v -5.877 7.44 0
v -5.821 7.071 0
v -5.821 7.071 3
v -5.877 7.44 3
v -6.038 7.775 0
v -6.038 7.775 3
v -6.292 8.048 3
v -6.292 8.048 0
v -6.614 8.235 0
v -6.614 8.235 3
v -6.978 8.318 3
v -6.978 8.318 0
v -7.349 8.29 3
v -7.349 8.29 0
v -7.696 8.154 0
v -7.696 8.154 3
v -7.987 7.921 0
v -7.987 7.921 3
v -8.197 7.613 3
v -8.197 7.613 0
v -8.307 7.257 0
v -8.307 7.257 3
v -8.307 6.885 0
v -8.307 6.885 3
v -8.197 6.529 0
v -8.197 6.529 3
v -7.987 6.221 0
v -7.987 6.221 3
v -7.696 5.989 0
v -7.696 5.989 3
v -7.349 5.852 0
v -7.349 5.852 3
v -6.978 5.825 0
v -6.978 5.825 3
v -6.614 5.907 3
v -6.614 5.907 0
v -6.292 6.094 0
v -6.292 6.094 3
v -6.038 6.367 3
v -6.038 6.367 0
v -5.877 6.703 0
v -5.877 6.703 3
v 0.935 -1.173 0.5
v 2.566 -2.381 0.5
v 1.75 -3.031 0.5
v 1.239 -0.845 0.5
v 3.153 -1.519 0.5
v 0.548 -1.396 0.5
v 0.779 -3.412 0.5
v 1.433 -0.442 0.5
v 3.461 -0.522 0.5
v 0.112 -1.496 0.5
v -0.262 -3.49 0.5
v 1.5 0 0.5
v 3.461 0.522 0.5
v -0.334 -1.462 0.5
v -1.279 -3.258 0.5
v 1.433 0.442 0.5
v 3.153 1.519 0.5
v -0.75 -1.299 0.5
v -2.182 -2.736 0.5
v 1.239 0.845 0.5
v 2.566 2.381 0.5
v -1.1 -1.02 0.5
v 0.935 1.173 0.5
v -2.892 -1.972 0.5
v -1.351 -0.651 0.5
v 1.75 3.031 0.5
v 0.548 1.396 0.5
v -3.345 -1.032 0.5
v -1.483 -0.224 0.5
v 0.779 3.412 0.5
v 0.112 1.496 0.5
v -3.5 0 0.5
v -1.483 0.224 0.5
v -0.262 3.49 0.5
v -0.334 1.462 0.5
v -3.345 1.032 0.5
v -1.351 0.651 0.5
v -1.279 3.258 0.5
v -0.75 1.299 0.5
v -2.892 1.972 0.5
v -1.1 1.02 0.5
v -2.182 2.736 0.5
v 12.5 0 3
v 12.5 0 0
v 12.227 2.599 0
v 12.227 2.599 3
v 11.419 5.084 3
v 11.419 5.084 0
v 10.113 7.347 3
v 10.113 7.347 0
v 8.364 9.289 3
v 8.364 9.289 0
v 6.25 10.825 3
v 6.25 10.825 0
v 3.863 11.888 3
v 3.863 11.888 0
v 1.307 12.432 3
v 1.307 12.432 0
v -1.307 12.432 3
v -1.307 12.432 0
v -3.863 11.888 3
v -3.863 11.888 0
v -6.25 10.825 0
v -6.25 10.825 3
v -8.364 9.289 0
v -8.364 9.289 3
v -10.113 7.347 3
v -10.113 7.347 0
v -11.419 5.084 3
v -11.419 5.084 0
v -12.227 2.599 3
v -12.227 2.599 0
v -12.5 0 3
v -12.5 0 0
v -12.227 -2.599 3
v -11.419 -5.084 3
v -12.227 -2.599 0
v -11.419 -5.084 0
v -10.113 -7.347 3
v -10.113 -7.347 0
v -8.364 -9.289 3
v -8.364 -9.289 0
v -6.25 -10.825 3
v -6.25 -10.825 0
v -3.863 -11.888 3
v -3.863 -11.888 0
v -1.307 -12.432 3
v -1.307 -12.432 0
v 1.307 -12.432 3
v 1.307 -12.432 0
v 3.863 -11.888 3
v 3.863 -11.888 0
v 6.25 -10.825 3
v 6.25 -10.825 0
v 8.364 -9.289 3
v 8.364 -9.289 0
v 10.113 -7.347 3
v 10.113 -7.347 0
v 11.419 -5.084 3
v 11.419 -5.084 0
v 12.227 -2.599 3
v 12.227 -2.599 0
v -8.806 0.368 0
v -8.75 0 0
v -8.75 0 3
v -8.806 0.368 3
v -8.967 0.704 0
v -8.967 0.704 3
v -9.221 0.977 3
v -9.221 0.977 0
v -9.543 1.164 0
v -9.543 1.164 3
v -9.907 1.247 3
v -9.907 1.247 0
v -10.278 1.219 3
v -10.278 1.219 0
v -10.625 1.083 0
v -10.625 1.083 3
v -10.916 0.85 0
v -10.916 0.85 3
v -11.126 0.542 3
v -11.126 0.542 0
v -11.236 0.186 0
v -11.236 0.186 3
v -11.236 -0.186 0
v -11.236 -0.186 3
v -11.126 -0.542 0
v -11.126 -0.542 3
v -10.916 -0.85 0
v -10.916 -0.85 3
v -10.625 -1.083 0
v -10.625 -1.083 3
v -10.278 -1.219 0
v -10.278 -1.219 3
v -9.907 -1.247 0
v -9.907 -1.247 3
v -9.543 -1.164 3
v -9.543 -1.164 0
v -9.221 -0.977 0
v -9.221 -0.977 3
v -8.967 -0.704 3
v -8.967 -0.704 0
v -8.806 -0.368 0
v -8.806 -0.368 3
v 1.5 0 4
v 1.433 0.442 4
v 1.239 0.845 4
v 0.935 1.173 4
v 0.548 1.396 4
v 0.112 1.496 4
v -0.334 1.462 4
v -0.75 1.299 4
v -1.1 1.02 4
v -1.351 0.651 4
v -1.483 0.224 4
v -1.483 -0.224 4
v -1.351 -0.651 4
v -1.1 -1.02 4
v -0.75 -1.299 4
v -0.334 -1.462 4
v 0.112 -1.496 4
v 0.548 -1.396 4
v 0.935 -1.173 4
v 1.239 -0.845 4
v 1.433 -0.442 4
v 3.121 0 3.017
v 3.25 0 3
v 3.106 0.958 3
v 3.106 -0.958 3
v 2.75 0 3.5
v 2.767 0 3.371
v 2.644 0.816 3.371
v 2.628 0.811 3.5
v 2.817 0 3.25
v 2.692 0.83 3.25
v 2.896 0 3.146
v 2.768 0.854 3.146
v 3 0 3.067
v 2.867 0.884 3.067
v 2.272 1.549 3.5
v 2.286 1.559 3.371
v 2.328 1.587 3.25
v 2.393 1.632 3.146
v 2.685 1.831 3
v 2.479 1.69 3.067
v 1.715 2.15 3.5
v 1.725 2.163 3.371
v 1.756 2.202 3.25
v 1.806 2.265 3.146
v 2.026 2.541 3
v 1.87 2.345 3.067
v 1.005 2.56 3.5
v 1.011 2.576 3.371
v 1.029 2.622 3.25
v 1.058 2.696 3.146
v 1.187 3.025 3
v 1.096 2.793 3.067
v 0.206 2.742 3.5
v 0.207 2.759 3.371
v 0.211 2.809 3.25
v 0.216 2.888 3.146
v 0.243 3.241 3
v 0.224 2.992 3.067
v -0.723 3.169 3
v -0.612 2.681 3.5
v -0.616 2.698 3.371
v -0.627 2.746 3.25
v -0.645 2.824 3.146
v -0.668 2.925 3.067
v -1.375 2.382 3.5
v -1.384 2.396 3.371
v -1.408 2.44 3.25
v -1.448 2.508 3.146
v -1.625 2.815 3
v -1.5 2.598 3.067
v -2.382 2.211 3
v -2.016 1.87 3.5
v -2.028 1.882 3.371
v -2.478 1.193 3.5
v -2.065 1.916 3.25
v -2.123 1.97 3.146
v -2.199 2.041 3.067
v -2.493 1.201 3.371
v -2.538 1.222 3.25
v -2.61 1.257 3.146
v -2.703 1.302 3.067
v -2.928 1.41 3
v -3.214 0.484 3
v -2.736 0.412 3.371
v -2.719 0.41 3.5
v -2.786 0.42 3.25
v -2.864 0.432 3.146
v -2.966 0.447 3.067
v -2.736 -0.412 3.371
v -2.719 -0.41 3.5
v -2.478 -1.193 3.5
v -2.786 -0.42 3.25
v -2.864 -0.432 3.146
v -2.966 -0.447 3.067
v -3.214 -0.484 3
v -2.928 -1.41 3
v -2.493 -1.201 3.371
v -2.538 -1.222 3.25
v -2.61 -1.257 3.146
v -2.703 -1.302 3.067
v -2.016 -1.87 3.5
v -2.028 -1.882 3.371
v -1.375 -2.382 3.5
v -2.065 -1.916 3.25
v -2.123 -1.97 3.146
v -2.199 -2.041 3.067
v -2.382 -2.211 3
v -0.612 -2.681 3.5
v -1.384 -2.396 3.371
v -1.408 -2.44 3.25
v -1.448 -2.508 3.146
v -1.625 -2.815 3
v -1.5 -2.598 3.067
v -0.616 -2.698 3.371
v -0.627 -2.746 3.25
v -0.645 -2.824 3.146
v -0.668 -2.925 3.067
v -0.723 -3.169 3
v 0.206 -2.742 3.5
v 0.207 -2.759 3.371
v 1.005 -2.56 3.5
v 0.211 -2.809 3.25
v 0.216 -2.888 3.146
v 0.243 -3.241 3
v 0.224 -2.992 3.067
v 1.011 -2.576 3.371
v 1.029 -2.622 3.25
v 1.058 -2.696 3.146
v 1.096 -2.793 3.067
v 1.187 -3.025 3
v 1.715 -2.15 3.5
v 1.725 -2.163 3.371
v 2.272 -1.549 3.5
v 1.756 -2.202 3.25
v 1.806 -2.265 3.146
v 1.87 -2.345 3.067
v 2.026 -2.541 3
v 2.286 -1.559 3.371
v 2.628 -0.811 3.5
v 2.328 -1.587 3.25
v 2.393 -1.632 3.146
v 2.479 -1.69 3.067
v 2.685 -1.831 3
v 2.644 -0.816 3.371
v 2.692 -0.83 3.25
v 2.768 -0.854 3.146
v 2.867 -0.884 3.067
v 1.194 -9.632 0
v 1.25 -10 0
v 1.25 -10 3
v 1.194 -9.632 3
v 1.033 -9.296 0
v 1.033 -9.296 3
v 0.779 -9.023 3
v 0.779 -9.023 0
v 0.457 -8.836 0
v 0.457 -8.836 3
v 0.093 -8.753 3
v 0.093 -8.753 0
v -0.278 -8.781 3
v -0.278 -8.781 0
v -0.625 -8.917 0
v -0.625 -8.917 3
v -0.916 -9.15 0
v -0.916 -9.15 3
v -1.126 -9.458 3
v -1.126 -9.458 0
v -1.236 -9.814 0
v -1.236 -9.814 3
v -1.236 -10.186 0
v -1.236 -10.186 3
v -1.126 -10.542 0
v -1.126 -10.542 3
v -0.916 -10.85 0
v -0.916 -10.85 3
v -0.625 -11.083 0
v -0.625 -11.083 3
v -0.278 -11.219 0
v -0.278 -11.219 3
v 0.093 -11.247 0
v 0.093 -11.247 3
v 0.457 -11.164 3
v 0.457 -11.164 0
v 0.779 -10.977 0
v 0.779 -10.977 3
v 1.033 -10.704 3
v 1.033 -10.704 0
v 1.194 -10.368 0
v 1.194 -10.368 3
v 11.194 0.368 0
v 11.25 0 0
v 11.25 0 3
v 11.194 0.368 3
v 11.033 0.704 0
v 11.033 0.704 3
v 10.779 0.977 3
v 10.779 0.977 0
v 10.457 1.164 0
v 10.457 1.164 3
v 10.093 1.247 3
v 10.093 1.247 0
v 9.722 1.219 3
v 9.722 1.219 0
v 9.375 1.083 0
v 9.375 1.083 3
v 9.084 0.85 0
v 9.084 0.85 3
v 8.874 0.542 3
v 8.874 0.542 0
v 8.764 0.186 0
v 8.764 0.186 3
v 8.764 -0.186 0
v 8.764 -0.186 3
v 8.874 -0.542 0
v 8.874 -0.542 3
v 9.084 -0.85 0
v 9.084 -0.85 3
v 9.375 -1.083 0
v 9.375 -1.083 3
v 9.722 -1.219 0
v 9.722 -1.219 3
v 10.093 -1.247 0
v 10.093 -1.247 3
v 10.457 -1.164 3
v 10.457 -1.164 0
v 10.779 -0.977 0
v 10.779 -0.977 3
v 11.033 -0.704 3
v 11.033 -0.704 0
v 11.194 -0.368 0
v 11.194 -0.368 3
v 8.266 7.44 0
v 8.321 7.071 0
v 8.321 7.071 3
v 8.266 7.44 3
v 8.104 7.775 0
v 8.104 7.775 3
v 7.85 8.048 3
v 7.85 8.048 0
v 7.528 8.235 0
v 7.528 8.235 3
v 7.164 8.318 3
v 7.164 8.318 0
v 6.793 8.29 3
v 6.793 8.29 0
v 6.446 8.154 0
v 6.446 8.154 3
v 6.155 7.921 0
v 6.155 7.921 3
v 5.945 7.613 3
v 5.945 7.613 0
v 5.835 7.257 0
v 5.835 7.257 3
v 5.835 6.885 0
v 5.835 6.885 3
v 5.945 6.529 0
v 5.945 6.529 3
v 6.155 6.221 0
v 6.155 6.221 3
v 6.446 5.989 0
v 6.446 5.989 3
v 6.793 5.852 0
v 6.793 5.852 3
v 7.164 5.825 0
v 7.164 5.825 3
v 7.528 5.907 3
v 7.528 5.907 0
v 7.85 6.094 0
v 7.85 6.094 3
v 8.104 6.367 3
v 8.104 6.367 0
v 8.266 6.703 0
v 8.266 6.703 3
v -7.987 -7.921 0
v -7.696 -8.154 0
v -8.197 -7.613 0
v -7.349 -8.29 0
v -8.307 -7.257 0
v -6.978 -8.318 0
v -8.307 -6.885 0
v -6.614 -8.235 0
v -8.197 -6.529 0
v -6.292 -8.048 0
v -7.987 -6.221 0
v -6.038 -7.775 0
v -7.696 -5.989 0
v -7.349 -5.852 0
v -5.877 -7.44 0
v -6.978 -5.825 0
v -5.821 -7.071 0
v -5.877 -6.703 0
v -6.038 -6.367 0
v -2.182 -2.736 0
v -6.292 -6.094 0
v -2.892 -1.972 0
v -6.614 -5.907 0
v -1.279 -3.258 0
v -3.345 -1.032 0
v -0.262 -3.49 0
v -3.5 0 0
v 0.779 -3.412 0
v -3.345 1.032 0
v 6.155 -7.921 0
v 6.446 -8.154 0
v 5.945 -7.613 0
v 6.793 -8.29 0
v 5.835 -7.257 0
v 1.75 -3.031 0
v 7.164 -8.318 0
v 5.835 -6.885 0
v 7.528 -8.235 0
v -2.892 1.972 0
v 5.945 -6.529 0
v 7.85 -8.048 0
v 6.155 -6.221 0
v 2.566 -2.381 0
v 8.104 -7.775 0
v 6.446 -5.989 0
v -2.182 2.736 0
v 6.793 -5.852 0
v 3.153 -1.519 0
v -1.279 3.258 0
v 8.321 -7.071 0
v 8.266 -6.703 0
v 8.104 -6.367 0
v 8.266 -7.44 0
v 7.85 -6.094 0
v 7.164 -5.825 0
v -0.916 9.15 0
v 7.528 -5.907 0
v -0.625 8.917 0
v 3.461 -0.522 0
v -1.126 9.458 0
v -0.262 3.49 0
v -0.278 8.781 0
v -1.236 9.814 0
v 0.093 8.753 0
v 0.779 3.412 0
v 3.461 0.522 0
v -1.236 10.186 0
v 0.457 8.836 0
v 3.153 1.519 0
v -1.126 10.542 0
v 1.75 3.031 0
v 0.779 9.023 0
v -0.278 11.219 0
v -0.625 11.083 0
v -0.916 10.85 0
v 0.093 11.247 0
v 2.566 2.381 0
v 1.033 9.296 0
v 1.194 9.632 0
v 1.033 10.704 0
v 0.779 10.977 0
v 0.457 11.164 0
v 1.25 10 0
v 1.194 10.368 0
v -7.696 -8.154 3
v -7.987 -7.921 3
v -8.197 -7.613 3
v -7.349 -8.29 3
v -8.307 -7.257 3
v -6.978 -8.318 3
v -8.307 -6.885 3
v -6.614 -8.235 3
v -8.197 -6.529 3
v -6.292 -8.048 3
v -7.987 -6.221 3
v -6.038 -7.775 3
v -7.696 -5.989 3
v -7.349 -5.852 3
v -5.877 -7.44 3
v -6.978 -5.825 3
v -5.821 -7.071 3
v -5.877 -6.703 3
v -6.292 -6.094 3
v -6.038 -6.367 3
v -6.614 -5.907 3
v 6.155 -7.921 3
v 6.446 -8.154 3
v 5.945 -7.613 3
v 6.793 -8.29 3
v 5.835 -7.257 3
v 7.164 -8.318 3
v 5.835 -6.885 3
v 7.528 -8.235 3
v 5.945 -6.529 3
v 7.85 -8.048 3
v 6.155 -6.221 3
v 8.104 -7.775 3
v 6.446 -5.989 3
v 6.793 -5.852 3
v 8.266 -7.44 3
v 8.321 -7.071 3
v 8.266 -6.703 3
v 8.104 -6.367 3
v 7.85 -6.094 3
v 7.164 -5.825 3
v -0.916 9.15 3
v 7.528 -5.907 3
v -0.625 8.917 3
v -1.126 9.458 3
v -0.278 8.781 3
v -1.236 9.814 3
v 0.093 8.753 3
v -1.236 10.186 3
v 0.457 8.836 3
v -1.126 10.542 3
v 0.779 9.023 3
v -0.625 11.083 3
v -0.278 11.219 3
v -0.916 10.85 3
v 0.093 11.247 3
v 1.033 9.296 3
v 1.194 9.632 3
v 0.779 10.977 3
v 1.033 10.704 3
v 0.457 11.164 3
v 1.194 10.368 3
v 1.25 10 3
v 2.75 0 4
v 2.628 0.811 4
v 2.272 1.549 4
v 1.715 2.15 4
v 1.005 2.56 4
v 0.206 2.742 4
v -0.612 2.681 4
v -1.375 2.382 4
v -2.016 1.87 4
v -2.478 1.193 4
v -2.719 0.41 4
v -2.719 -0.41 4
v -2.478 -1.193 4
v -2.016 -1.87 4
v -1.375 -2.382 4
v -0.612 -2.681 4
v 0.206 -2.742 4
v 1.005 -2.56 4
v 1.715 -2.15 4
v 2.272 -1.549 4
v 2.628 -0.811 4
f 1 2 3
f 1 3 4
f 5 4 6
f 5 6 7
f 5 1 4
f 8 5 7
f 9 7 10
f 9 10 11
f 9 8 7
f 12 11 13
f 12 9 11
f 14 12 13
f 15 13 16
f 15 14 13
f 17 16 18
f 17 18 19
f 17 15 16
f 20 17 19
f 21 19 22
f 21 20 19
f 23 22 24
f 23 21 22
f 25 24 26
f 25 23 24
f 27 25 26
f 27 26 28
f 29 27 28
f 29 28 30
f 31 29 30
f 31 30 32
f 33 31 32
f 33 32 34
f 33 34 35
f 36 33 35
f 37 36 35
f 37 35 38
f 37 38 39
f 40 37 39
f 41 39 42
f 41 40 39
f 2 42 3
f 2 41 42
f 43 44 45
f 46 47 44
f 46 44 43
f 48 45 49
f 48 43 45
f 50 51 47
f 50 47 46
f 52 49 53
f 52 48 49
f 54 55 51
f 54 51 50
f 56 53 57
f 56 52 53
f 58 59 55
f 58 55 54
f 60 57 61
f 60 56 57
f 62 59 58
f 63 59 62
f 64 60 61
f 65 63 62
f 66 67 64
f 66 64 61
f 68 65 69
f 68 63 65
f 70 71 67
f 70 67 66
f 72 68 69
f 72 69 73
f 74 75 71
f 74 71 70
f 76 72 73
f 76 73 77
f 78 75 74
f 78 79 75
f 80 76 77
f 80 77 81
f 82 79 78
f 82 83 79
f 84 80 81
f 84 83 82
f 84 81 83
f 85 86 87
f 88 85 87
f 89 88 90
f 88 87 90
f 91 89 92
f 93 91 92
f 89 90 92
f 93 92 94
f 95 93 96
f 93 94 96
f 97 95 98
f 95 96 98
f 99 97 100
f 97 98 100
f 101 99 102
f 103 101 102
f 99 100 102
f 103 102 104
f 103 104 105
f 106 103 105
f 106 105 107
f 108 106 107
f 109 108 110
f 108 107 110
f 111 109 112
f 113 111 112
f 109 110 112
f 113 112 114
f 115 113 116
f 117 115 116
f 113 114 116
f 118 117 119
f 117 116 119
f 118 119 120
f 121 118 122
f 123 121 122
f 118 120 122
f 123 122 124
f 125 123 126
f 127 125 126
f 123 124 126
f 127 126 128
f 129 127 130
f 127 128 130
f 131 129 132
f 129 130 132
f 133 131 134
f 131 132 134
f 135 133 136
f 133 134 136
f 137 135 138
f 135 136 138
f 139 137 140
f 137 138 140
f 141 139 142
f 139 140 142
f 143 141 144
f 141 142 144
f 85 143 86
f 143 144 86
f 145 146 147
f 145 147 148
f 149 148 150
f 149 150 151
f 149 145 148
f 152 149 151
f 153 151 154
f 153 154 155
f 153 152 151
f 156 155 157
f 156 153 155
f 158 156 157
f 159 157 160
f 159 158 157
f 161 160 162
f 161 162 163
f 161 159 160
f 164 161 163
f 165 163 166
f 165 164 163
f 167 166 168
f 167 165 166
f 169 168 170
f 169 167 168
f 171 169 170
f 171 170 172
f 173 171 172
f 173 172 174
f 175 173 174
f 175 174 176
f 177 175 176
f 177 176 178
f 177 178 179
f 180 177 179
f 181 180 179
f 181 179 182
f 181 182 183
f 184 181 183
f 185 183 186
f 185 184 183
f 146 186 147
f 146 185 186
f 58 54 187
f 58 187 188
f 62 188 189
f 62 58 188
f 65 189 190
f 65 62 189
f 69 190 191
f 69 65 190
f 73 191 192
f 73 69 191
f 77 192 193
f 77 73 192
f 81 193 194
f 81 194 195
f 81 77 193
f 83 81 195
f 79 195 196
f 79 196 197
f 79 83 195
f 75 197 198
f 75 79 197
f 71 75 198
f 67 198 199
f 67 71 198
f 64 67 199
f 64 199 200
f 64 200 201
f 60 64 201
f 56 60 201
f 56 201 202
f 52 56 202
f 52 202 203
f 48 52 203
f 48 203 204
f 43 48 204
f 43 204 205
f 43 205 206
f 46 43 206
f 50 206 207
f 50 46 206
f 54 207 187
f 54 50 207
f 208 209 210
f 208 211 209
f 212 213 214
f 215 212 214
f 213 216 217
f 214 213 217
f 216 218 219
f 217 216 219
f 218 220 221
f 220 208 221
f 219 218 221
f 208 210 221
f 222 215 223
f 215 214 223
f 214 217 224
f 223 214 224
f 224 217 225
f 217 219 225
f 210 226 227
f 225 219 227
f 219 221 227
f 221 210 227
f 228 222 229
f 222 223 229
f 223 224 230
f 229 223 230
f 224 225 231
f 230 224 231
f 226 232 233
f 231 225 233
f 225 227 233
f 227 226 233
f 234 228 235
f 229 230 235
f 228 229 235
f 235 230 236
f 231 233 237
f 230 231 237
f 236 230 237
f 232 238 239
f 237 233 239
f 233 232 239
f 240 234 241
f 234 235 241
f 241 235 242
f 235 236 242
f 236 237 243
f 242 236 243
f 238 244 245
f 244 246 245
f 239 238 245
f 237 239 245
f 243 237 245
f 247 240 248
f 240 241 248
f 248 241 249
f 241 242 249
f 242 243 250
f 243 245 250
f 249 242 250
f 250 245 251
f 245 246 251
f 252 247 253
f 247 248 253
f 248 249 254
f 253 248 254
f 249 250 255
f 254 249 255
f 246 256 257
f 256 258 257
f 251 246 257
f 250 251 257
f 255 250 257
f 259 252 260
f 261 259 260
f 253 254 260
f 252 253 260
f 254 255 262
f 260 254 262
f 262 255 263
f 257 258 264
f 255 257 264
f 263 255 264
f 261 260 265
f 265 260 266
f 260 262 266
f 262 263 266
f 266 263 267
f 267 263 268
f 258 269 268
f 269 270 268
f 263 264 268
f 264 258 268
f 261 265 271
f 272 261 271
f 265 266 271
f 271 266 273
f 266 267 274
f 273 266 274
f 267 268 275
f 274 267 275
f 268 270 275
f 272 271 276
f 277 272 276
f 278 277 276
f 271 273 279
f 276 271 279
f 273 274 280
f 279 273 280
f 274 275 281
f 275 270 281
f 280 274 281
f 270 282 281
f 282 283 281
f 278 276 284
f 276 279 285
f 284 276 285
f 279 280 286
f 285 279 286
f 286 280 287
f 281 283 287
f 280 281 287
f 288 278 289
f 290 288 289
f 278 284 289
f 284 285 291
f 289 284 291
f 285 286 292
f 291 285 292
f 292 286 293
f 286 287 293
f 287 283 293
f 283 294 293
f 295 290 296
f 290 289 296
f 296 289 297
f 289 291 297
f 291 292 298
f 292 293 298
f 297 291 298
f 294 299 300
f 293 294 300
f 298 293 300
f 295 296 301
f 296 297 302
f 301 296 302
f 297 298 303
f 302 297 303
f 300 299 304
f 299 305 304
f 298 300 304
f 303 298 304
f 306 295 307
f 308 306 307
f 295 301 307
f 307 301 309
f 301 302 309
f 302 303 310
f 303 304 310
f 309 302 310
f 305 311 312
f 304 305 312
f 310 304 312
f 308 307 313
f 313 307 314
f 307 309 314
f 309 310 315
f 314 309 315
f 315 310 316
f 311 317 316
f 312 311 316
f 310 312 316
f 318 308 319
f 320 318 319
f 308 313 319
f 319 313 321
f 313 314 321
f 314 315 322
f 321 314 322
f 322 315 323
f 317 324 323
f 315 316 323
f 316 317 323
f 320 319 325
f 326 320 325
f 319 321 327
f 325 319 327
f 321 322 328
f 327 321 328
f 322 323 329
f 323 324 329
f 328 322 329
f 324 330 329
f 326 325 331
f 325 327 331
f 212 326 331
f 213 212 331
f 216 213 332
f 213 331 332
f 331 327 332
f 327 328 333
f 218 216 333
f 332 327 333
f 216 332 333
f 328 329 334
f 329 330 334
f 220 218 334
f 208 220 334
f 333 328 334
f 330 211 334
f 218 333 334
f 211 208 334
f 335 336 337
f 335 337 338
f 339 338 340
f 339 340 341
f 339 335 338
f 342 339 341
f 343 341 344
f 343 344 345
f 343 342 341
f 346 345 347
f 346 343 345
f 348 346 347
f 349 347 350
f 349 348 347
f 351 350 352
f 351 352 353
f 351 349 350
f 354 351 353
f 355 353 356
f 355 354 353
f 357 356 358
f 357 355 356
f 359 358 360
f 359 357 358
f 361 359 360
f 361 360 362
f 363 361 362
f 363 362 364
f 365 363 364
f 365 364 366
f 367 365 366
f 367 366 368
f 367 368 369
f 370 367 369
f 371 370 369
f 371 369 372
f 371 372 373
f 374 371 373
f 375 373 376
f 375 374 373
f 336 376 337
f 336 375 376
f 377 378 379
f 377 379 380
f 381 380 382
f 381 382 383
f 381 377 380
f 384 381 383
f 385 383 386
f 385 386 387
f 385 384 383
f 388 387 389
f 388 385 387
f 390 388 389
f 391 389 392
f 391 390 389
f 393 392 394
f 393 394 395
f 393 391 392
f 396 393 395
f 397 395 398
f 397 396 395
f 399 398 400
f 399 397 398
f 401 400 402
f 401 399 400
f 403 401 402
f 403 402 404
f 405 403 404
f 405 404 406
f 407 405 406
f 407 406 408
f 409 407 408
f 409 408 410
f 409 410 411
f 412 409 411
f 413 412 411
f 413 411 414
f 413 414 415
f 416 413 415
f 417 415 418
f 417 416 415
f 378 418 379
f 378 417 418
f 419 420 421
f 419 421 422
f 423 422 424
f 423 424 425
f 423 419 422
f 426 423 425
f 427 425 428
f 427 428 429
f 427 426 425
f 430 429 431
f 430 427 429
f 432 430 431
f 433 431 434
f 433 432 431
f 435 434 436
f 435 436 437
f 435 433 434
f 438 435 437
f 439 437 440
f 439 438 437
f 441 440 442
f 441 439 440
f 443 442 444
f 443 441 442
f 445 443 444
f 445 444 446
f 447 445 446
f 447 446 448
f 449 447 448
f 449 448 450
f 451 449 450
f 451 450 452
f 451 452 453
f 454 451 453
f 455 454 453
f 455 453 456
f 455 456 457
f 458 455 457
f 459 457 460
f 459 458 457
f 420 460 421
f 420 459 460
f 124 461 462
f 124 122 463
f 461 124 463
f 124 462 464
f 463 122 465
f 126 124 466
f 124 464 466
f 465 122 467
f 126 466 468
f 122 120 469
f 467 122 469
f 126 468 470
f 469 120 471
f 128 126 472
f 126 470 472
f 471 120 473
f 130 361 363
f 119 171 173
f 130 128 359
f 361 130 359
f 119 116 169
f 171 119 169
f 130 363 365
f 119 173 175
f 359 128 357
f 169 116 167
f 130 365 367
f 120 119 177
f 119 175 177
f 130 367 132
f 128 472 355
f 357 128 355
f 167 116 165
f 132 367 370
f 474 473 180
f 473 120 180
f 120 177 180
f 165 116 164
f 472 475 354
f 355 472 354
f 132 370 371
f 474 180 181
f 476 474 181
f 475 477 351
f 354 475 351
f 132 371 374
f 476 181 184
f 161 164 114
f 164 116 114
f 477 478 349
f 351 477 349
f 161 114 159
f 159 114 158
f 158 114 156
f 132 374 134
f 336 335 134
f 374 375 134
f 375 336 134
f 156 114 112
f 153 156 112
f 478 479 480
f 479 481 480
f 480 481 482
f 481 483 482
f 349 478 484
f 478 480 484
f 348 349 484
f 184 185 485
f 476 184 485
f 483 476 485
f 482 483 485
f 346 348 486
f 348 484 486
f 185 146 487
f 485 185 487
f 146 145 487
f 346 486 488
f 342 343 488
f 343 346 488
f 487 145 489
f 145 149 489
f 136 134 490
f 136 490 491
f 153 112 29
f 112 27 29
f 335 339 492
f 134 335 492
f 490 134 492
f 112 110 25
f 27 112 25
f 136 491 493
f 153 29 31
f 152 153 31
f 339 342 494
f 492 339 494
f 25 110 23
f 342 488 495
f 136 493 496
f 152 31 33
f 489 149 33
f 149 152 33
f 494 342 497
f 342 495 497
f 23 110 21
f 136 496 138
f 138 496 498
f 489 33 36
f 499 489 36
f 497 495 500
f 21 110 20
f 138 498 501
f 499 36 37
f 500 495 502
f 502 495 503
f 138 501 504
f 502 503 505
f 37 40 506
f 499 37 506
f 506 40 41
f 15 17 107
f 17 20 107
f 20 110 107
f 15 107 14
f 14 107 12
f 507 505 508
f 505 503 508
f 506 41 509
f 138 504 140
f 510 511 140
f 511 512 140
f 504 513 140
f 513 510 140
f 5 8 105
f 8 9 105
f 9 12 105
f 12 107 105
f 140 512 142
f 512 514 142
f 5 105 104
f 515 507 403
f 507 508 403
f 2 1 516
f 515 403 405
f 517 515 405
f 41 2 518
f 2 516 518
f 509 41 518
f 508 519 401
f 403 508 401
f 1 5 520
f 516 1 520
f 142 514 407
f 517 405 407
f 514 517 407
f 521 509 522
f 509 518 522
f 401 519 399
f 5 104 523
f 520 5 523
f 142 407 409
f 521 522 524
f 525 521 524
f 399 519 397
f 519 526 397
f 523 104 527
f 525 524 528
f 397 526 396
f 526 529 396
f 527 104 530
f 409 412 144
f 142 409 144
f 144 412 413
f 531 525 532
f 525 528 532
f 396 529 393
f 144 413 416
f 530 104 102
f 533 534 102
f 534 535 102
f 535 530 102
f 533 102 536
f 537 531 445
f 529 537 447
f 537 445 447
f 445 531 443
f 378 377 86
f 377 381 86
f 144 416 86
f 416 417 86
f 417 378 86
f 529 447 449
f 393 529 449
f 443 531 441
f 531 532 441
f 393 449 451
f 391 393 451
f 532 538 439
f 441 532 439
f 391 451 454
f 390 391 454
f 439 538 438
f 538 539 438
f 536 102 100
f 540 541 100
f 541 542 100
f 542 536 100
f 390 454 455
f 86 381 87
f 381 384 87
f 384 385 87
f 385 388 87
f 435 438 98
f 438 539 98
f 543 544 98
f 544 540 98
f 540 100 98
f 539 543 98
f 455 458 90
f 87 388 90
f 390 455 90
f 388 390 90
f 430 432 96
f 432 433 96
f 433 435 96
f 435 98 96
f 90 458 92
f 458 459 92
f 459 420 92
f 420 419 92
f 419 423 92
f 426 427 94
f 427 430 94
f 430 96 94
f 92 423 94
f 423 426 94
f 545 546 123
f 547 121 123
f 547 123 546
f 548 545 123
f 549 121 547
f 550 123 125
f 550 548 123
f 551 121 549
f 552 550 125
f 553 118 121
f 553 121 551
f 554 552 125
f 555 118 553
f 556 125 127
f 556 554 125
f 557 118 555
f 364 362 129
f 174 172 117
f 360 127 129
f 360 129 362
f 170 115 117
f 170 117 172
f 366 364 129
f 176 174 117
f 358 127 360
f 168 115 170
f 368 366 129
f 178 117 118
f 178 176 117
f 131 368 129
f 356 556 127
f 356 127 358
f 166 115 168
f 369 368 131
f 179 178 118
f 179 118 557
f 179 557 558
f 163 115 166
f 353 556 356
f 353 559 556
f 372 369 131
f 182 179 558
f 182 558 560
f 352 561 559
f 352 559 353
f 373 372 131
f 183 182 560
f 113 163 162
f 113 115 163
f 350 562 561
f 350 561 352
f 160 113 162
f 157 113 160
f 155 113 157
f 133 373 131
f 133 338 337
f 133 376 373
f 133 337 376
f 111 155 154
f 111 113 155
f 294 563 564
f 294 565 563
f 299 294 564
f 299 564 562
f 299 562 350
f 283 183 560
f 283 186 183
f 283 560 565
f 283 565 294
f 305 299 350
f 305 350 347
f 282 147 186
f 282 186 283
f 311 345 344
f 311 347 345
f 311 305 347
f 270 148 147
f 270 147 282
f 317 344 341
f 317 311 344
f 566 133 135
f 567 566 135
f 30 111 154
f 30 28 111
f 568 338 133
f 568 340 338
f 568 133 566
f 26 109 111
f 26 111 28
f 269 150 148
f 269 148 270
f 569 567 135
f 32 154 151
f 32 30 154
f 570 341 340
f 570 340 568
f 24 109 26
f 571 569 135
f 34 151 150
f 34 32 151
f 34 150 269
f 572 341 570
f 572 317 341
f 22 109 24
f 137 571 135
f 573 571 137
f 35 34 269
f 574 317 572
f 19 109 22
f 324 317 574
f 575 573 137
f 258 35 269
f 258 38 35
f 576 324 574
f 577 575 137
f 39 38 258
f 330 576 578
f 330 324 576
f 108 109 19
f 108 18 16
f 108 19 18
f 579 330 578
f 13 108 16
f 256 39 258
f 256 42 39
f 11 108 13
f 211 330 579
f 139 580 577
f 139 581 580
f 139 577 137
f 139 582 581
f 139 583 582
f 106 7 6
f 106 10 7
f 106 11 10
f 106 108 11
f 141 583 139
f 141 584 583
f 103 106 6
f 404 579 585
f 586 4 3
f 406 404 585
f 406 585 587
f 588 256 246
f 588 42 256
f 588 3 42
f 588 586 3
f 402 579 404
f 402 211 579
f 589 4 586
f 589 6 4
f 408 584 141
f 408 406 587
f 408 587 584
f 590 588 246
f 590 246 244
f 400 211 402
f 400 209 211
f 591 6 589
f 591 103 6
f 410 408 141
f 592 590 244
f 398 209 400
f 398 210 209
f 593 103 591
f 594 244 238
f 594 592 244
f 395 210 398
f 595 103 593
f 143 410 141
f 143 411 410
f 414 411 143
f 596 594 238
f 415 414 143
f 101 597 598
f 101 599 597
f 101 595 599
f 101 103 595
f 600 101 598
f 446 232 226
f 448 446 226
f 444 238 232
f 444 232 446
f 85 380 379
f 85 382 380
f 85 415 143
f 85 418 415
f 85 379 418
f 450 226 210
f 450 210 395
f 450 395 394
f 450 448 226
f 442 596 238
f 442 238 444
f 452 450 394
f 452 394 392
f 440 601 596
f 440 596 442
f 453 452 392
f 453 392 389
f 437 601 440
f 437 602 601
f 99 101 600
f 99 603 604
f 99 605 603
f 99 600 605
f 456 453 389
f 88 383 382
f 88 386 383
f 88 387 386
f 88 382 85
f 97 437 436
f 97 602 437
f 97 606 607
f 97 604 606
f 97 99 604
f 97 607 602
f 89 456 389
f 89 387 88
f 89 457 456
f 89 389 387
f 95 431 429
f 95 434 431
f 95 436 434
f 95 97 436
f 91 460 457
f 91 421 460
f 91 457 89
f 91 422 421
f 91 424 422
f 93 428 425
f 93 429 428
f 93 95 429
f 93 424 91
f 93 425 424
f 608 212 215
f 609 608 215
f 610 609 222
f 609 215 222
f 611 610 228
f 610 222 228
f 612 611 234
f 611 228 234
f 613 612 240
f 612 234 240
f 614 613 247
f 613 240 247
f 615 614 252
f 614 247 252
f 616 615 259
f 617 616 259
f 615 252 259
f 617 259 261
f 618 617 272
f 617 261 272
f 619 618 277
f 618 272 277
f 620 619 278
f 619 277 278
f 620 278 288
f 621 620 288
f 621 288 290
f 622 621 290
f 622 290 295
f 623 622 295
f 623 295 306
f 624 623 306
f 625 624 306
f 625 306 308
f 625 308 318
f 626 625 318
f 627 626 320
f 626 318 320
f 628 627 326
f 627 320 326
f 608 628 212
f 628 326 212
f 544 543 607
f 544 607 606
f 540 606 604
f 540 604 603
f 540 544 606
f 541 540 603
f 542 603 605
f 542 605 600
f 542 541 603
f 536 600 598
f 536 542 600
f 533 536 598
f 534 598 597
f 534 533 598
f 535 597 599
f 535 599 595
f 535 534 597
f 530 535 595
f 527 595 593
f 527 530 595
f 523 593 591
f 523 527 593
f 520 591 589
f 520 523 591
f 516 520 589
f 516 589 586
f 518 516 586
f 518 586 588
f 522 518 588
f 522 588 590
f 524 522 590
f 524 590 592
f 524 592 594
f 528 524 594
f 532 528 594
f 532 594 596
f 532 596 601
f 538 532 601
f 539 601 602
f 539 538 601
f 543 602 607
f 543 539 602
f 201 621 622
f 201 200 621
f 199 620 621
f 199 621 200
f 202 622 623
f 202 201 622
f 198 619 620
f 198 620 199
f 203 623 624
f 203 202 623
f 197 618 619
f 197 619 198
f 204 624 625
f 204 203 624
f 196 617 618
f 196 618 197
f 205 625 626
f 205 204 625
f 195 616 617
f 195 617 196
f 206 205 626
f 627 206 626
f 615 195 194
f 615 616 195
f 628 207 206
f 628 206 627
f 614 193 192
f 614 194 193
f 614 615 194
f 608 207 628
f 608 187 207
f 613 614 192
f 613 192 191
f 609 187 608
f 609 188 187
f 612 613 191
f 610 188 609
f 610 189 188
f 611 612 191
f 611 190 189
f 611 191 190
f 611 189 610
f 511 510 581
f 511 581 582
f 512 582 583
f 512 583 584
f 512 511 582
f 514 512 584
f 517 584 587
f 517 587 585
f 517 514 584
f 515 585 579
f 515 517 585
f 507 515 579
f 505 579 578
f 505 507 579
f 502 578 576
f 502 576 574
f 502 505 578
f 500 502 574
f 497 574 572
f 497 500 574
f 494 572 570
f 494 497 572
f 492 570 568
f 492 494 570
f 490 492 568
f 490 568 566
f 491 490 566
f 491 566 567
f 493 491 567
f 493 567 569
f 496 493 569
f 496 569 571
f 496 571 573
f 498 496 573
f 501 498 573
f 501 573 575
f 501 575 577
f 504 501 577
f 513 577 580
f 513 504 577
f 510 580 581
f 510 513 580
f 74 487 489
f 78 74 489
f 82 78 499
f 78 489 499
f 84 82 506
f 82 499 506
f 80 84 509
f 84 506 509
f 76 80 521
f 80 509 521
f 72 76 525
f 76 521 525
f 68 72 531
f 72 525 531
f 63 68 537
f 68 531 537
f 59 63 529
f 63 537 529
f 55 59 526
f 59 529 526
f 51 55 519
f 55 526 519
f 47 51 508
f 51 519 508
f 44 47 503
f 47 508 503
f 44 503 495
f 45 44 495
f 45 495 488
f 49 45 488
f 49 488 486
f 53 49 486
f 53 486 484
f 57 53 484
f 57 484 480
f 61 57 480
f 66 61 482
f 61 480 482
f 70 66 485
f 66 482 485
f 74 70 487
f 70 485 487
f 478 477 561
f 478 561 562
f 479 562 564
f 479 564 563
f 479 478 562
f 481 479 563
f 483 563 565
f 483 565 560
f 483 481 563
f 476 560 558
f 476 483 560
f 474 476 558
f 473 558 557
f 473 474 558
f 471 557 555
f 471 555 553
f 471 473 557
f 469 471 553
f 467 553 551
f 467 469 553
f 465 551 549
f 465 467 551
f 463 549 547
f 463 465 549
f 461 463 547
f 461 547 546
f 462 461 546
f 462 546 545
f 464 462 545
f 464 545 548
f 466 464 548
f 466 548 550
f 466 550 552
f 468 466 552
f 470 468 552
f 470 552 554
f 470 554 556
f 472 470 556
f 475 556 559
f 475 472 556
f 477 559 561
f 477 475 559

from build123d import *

# Parameters (mm, degrees)
SKETCH1_R           = 12.5
SKETCH1_R_2         = 1.25
SKETCH1_R_3         = 1.5
BOSS_EXTRUDE1_DEPTH = 3
SKETCH2_R           = 2.75
SKETCH2_R_2         = 1.5
BOSS_EXTRUDE2_DEPTH = 1
FILLET1_R           = 0.5
SKETCH3_R           = 3.5
SKETCH3_R_2         = 1.5
CUT_EXTRUDE1_DEPTH  = 0.5


with BuildPart() as part:
    # Sketch1 → Boss-Extrude1 (new body)
    with BuildSketch(Plane.XY):
        Circle(SKETCH1_R)
        with Locations((0, 10)):
            Circle(SKETCH1_R_2, mode=Mode.SUBTRACT)
        Circle(SKETCH1_R_3, mode=Mode.SUBTRACT)
        with Locations((7.071067812, 7.071067812)):
            Circle(SKETCH1_R_2, mode=Mode.SUBTRACT)
        with Locations((10, 0)):
            Circle(SKETCH1_R_2, mode=Mode.SUBTRACT)
        with Locations((7.071067812, -7.071067812)):
            Circle(SKETCH1_R_2, mode=Mode.SUBTRACT)
        with Locations((0, -10)):
            Circle(SKETCH1_R_2, mode=Mode.SUBTRACT)
        with Locations((-7.071067812, -7.071067812)):
            Circle(SKETCH1_R_2, mode=Mode.SUBTRACT)
        with Locations((-10, 0)):
            Circle(SKETCH1_R_2, mode=Mode.SUBTRACT)
        with Locations((-7.071067812, 7.071067812)):
            Circle(SKETCH1_R_2, mode=Mode.SUBTRACT)
    extrude(amount=BOSS_EXTRUDE1_DEPTH)

    # Sketch2 → Boss-Extrude2 (add)
    with BuildSketch(Plane.XY.offset(3)):
        Circle(SKETCH2_R)
        Circle(SKETCH2_R_2, mode=Mode.SUBTRACT)
    extrude(amount=BOSS_EXTRUDE2_DEPTH)

    # Fillet1
    fillet1_edges = [part.edges().sort_by_distance(p)[0] for p in [
        (-2.75, 0, 3),
    ]]
    fillet(fillet1_edges, radius=FILLET1_R)

    # Sketch3 → Cut-Extrude1 (cut)
    with BuildSketch(Plane(origin=(0, 0, 0), x_dir=(-1, 0, 0), z_dir=(0, 0, -1))):
        Circle(SKETCH3_R)
        Circle(SKETCH3_R_2, mode=Mode.SUBTRACT)
    extrude(amount=-CUT_EXTRUDE1_DEPTH, mode=Mode.SUBTRACT)


solid = part.part
